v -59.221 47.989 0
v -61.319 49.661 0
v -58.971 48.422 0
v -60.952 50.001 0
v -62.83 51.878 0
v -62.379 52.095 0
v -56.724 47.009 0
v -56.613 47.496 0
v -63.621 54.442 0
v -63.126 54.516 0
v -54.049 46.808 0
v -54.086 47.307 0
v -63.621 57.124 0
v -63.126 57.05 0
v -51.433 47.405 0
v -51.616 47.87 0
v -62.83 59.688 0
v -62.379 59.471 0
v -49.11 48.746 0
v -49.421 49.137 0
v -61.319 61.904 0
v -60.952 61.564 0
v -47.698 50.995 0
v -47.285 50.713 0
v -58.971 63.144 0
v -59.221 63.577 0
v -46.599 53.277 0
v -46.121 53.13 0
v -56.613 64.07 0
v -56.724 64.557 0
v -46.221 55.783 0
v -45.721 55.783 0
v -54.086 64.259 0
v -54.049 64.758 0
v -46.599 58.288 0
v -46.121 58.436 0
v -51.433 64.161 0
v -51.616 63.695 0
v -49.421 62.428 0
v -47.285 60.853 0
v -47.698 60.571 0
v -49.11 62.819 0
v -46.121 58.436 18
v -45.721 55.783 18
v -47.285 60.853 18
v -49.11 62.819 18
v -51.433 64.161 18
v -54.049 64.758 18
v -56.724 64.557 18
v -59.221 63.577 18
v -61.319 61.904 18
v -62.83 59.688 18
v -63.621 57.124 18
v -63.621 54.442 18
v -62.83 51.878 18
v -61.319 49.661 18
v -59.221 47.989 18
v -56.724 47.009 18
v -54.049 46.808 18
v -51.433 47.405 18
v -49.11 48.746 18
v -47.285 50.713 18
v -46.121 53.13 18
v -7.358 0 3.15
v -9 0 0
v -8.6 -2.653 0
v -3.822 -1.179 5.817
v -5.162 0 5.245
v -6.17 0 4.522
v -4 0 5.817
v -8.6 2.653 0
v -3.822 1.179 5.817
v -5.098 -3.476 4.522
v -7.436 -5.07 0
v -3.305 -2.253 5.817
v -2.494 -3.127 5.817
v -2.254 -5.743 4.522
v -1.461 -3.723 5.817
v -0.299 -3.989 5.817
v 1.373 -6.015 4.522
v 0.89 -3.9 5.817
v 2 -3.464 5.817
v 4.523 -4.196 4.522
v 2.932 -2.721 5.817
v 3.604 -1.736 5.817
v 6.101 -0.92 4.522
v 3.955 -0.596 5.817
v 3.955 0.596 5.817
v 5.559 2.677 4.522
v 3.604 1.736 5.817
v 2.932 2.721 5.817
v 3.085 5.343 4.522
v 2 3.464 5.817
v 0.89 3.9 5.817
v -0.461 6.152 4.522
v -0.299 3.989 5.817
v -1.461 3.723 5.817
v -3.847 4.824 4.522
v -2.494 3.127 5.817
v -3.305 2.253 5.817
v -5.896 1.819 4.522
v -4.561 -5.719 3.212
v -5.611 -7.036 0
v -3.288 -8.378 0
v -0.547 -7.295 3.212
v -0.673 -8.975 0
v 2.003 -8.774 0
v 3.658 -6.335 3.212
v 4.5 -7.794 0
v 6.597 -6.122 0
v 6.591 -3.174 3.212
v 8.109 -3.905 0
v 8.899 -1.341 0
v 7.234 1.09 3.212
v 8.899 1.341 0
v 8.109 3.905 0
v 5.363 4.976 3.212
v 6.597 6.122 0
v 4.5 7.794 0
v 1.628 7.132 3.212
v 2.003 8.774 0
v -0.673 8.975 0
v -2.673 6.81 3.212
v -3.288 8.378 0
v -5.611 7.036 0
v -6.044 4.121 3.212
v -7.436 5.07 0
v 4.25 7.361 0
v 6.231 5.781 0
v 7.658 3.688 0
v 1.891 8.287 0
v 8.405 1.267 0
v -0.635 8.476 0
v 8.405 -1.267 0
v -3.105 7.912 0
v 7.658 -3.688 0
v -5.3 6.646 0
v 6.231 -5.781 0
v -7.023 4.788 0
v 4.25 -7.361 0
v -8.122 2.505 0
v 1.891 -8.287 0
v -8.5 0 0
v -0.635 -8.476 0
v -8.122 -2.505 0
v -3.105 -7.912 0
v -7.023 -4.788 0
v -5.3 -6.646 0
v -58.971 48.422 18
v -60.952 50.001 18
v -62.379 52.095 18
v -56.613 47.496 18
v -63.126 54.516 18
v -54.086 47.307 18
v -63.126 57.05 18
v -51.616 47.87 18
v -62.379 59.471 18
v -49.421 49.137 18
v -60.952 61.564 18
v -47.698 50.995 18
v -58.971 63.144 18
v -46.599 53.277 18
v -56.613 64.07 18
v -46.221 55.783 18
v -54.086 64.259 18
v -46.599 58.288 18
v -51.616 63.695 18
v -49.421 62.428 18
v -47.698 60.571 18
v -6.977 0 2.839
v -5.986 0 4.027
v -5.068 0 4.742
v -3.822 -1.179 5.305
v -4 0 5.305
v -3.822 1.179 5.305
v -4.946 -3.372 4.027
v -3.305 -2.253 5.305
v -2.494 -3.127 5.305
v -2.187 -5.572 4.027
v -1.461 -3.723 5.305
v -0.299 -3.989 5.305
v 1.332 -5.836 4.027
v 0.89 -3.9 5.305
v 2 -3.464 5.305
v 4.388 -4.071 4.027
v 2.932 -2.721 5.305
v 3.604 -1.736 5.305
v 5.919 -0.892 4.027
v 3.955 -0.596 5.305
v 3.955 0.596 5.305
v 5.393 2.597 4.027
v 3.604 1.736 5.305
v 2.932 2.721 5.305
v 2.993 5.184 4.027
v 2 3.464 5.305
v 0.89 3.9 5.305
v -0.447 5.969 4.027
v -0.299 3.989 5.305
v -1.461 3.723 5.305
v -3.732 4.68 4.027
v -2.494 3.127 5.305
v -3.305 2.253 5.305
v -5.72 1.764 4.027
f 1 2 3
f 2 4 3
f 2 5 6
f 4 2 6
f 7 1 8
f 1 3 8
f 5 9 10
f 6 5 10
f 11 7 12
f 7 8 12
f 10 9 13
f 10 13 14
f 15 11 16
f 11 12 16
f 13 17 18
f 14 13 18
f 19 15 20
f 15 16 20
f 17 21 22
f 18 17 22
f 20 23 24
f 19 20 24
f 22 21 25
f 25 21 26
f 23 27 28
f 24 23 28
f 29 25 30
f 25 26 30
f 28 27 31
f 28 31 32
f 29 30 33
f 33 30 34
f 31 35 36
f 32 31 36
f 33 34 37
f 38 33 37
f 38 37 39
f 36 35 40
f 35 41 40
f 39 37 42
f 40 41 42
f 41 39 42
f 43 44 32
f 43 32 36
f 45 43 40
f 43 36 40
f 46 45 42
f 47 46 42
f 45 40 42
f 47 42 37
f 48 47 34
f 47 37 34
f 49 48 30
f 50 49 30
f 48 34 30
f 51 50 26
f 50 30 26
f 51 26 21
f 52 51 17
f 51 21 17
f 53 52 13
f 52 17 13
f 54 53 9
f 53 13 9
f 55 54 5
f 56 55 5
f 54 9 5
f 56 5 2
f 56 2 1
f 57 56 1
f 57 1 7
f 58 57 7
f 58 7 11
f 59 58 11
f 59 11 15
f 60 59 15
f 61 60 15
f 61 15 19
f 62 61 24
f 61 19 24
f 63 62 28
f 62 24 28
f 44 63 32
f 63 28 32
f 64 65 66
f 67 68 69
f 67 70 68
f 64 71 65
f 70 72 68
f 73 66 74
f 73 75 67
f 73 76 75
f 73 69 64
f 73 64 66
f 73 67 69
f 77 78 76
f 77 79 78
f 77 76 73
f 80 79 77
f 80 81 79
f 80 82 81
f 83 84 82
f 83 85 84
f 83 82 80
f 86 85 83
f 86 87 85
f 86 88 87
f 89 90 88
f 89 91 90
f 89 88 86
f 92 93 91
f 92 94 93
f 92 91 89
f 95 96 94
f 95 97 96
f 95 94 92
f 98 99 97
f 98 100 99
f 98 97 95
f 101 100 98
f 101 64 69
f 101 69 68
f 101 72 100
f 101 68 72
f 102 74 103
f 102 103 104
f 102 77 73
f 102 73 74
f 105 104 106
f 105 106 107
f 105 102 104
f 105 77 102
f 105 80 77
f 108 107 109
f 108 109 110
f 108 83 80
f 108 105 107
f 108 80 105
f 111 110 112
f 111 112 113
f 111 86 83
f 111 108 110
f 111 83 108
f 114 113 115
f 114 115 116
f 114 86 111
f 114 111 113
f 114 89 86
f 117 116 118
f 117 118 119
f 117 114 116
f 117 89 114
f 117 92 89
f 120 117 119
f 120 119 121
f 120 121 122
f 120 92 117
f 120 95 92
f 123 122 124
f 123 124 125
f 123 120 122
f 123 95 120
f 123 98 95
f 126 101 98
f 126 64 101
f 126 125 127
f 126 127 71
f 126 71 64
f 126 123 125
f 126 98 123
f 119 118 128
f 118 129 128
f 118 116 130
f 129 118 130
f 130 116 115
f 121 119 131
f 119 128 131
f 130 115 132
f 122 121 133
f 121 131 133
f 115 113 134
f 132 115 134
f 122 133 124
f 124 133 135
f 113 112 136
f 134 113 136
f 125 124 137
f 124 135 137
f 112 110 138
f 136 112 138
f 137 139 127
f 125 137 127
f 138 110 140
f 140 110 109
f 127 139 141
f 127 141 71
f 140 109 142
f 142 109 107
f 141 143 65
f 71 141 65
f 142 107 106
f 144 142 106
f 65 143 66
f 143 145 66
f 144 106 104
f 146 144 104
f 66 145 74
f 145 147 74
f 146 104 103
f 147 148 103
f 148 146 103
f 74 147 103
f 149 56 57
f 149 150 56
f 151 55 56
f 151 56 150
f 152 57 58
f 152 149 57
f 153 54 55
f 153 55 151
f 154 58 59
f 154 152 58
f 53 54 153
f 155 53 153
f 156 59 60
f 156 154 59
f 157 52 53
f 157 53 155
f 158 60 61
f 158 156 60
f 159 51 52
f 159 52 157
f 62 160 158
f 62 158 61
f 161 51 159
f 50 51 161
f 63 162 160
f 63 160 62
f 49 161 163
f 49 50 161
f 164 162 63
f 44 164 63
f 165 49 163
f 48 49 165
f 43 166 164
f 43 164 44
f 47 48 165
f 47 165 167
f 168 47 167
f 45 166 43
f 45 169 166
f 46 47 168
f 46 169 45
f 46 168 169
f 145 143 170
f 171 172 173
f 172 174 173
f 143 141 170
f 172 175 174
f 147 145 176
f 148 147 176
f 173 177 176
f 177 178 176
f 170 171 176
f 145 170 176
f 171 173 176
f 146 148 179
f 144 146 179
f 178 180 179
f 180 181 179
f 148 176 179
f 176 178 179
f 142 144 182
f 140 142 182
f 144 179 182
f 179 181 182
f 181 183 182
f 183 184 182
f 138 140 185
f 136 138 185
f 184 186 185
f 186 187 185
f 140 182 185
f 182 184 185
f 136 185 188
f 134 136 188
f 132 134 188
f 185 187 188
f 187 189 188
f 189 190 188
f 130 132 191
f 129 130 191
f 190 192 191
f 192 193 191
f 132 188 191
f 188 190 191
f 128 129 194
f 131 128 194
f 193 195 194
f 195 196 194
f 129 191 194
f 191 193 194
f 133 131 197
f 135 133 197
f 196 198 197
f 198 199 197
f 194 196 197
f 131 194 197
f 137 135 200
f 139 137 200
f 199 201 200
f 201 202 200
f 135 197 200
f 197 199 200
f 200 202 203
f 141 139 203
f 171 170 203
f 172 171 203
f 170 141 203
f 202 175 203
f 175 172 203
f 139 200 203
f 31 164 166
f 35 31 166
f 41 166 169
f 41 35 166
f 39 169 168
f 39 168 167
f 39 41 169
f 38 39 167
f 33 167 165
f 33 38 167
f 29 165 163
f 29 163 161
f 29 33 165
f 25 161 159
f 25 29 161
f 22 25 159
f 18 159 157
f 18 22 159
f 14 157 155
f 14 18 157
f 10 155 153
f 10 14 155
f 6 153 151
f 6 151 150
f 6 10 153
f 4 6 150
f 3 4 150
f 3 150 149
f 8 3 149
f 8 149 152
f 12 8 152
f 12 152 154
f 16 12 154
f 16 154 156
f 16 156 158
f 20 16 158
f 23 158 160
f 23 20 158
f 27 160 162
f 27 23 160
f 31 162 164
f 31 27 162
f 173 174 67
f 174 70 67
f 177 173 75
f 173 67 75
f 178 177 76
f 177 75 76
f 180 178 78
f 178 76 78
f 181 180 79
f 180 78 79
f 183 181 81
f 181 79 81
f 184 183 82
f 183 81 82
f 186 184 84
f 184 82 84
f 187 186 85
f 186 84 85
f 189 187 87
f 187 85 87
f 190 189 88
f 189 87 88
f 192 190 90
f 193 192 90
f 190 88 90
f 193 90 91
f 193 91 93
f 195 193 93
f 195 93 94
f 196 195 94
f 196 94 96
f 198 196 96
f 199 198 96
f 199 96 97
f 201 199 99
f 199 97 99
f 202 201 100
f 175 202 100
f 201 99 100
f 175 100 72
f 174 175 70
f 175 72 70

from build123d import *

# Parameters (mm, degrees)
F0_R     = 9
F0_R_2   = 8.5
F1_DEPTH = 18


with BuildPart() as f1:
    # F0 (on Top) → F1 (new body)
    with BuildSketch(Plane.XY):
        with Locations((-54.7211095691, 55.7828843594)):
            Circle(F0_R)
        with Locations((-54.7211095691, 55.7828843594)):
            Circle(F0_R_2, mode=Mode.SUBTRACT)
    extrude(amount=F1_DEPTH)


with BuildPart() as f3:
    # F2 (on Front) → F3 (revolve)
    with BuildSketch(Plane.XZ):
        with BuildLine():
            add(Edge.make_bspline(
                [(-9, 0), (-8.2061928864, 1.756192534), (-7.0883196397, 4.2293381157), (-4.7437136695, 5.5088051811), (-4, 5.8174179779)],
                knots=[0, 0, 0, 0, 0.4814110146, 0.6779436063, 0.6779436063, 0.6779436063, 0.6779436063], degree=3))
            Line((-9, 0), (-8.5, 0))
            add(Edge.make_bspline(
                [(-8.5, 0), (-7.7234594348, 1.643246113), (-6.6733334202, 3.8654302064), (-4.5898606377, 5.0451498847), (-4, 5.30502297)],
                knots=[0, 0, 0, 0, 0.4829129871, 0.6530499844, 0.6530499844, 0.6530499844, 0.6530499844], degree=3))
            Line((-4, 5.30502297), (-4, 5.3174179779))
            Line((-4, 5.3174179779), (-4, 5.8174179779))
        make_face()
    revolve(axis=Axis((0, 0, 3.5), (0, 0, 1)))


solid = Compound([f1.part, f3.part])
